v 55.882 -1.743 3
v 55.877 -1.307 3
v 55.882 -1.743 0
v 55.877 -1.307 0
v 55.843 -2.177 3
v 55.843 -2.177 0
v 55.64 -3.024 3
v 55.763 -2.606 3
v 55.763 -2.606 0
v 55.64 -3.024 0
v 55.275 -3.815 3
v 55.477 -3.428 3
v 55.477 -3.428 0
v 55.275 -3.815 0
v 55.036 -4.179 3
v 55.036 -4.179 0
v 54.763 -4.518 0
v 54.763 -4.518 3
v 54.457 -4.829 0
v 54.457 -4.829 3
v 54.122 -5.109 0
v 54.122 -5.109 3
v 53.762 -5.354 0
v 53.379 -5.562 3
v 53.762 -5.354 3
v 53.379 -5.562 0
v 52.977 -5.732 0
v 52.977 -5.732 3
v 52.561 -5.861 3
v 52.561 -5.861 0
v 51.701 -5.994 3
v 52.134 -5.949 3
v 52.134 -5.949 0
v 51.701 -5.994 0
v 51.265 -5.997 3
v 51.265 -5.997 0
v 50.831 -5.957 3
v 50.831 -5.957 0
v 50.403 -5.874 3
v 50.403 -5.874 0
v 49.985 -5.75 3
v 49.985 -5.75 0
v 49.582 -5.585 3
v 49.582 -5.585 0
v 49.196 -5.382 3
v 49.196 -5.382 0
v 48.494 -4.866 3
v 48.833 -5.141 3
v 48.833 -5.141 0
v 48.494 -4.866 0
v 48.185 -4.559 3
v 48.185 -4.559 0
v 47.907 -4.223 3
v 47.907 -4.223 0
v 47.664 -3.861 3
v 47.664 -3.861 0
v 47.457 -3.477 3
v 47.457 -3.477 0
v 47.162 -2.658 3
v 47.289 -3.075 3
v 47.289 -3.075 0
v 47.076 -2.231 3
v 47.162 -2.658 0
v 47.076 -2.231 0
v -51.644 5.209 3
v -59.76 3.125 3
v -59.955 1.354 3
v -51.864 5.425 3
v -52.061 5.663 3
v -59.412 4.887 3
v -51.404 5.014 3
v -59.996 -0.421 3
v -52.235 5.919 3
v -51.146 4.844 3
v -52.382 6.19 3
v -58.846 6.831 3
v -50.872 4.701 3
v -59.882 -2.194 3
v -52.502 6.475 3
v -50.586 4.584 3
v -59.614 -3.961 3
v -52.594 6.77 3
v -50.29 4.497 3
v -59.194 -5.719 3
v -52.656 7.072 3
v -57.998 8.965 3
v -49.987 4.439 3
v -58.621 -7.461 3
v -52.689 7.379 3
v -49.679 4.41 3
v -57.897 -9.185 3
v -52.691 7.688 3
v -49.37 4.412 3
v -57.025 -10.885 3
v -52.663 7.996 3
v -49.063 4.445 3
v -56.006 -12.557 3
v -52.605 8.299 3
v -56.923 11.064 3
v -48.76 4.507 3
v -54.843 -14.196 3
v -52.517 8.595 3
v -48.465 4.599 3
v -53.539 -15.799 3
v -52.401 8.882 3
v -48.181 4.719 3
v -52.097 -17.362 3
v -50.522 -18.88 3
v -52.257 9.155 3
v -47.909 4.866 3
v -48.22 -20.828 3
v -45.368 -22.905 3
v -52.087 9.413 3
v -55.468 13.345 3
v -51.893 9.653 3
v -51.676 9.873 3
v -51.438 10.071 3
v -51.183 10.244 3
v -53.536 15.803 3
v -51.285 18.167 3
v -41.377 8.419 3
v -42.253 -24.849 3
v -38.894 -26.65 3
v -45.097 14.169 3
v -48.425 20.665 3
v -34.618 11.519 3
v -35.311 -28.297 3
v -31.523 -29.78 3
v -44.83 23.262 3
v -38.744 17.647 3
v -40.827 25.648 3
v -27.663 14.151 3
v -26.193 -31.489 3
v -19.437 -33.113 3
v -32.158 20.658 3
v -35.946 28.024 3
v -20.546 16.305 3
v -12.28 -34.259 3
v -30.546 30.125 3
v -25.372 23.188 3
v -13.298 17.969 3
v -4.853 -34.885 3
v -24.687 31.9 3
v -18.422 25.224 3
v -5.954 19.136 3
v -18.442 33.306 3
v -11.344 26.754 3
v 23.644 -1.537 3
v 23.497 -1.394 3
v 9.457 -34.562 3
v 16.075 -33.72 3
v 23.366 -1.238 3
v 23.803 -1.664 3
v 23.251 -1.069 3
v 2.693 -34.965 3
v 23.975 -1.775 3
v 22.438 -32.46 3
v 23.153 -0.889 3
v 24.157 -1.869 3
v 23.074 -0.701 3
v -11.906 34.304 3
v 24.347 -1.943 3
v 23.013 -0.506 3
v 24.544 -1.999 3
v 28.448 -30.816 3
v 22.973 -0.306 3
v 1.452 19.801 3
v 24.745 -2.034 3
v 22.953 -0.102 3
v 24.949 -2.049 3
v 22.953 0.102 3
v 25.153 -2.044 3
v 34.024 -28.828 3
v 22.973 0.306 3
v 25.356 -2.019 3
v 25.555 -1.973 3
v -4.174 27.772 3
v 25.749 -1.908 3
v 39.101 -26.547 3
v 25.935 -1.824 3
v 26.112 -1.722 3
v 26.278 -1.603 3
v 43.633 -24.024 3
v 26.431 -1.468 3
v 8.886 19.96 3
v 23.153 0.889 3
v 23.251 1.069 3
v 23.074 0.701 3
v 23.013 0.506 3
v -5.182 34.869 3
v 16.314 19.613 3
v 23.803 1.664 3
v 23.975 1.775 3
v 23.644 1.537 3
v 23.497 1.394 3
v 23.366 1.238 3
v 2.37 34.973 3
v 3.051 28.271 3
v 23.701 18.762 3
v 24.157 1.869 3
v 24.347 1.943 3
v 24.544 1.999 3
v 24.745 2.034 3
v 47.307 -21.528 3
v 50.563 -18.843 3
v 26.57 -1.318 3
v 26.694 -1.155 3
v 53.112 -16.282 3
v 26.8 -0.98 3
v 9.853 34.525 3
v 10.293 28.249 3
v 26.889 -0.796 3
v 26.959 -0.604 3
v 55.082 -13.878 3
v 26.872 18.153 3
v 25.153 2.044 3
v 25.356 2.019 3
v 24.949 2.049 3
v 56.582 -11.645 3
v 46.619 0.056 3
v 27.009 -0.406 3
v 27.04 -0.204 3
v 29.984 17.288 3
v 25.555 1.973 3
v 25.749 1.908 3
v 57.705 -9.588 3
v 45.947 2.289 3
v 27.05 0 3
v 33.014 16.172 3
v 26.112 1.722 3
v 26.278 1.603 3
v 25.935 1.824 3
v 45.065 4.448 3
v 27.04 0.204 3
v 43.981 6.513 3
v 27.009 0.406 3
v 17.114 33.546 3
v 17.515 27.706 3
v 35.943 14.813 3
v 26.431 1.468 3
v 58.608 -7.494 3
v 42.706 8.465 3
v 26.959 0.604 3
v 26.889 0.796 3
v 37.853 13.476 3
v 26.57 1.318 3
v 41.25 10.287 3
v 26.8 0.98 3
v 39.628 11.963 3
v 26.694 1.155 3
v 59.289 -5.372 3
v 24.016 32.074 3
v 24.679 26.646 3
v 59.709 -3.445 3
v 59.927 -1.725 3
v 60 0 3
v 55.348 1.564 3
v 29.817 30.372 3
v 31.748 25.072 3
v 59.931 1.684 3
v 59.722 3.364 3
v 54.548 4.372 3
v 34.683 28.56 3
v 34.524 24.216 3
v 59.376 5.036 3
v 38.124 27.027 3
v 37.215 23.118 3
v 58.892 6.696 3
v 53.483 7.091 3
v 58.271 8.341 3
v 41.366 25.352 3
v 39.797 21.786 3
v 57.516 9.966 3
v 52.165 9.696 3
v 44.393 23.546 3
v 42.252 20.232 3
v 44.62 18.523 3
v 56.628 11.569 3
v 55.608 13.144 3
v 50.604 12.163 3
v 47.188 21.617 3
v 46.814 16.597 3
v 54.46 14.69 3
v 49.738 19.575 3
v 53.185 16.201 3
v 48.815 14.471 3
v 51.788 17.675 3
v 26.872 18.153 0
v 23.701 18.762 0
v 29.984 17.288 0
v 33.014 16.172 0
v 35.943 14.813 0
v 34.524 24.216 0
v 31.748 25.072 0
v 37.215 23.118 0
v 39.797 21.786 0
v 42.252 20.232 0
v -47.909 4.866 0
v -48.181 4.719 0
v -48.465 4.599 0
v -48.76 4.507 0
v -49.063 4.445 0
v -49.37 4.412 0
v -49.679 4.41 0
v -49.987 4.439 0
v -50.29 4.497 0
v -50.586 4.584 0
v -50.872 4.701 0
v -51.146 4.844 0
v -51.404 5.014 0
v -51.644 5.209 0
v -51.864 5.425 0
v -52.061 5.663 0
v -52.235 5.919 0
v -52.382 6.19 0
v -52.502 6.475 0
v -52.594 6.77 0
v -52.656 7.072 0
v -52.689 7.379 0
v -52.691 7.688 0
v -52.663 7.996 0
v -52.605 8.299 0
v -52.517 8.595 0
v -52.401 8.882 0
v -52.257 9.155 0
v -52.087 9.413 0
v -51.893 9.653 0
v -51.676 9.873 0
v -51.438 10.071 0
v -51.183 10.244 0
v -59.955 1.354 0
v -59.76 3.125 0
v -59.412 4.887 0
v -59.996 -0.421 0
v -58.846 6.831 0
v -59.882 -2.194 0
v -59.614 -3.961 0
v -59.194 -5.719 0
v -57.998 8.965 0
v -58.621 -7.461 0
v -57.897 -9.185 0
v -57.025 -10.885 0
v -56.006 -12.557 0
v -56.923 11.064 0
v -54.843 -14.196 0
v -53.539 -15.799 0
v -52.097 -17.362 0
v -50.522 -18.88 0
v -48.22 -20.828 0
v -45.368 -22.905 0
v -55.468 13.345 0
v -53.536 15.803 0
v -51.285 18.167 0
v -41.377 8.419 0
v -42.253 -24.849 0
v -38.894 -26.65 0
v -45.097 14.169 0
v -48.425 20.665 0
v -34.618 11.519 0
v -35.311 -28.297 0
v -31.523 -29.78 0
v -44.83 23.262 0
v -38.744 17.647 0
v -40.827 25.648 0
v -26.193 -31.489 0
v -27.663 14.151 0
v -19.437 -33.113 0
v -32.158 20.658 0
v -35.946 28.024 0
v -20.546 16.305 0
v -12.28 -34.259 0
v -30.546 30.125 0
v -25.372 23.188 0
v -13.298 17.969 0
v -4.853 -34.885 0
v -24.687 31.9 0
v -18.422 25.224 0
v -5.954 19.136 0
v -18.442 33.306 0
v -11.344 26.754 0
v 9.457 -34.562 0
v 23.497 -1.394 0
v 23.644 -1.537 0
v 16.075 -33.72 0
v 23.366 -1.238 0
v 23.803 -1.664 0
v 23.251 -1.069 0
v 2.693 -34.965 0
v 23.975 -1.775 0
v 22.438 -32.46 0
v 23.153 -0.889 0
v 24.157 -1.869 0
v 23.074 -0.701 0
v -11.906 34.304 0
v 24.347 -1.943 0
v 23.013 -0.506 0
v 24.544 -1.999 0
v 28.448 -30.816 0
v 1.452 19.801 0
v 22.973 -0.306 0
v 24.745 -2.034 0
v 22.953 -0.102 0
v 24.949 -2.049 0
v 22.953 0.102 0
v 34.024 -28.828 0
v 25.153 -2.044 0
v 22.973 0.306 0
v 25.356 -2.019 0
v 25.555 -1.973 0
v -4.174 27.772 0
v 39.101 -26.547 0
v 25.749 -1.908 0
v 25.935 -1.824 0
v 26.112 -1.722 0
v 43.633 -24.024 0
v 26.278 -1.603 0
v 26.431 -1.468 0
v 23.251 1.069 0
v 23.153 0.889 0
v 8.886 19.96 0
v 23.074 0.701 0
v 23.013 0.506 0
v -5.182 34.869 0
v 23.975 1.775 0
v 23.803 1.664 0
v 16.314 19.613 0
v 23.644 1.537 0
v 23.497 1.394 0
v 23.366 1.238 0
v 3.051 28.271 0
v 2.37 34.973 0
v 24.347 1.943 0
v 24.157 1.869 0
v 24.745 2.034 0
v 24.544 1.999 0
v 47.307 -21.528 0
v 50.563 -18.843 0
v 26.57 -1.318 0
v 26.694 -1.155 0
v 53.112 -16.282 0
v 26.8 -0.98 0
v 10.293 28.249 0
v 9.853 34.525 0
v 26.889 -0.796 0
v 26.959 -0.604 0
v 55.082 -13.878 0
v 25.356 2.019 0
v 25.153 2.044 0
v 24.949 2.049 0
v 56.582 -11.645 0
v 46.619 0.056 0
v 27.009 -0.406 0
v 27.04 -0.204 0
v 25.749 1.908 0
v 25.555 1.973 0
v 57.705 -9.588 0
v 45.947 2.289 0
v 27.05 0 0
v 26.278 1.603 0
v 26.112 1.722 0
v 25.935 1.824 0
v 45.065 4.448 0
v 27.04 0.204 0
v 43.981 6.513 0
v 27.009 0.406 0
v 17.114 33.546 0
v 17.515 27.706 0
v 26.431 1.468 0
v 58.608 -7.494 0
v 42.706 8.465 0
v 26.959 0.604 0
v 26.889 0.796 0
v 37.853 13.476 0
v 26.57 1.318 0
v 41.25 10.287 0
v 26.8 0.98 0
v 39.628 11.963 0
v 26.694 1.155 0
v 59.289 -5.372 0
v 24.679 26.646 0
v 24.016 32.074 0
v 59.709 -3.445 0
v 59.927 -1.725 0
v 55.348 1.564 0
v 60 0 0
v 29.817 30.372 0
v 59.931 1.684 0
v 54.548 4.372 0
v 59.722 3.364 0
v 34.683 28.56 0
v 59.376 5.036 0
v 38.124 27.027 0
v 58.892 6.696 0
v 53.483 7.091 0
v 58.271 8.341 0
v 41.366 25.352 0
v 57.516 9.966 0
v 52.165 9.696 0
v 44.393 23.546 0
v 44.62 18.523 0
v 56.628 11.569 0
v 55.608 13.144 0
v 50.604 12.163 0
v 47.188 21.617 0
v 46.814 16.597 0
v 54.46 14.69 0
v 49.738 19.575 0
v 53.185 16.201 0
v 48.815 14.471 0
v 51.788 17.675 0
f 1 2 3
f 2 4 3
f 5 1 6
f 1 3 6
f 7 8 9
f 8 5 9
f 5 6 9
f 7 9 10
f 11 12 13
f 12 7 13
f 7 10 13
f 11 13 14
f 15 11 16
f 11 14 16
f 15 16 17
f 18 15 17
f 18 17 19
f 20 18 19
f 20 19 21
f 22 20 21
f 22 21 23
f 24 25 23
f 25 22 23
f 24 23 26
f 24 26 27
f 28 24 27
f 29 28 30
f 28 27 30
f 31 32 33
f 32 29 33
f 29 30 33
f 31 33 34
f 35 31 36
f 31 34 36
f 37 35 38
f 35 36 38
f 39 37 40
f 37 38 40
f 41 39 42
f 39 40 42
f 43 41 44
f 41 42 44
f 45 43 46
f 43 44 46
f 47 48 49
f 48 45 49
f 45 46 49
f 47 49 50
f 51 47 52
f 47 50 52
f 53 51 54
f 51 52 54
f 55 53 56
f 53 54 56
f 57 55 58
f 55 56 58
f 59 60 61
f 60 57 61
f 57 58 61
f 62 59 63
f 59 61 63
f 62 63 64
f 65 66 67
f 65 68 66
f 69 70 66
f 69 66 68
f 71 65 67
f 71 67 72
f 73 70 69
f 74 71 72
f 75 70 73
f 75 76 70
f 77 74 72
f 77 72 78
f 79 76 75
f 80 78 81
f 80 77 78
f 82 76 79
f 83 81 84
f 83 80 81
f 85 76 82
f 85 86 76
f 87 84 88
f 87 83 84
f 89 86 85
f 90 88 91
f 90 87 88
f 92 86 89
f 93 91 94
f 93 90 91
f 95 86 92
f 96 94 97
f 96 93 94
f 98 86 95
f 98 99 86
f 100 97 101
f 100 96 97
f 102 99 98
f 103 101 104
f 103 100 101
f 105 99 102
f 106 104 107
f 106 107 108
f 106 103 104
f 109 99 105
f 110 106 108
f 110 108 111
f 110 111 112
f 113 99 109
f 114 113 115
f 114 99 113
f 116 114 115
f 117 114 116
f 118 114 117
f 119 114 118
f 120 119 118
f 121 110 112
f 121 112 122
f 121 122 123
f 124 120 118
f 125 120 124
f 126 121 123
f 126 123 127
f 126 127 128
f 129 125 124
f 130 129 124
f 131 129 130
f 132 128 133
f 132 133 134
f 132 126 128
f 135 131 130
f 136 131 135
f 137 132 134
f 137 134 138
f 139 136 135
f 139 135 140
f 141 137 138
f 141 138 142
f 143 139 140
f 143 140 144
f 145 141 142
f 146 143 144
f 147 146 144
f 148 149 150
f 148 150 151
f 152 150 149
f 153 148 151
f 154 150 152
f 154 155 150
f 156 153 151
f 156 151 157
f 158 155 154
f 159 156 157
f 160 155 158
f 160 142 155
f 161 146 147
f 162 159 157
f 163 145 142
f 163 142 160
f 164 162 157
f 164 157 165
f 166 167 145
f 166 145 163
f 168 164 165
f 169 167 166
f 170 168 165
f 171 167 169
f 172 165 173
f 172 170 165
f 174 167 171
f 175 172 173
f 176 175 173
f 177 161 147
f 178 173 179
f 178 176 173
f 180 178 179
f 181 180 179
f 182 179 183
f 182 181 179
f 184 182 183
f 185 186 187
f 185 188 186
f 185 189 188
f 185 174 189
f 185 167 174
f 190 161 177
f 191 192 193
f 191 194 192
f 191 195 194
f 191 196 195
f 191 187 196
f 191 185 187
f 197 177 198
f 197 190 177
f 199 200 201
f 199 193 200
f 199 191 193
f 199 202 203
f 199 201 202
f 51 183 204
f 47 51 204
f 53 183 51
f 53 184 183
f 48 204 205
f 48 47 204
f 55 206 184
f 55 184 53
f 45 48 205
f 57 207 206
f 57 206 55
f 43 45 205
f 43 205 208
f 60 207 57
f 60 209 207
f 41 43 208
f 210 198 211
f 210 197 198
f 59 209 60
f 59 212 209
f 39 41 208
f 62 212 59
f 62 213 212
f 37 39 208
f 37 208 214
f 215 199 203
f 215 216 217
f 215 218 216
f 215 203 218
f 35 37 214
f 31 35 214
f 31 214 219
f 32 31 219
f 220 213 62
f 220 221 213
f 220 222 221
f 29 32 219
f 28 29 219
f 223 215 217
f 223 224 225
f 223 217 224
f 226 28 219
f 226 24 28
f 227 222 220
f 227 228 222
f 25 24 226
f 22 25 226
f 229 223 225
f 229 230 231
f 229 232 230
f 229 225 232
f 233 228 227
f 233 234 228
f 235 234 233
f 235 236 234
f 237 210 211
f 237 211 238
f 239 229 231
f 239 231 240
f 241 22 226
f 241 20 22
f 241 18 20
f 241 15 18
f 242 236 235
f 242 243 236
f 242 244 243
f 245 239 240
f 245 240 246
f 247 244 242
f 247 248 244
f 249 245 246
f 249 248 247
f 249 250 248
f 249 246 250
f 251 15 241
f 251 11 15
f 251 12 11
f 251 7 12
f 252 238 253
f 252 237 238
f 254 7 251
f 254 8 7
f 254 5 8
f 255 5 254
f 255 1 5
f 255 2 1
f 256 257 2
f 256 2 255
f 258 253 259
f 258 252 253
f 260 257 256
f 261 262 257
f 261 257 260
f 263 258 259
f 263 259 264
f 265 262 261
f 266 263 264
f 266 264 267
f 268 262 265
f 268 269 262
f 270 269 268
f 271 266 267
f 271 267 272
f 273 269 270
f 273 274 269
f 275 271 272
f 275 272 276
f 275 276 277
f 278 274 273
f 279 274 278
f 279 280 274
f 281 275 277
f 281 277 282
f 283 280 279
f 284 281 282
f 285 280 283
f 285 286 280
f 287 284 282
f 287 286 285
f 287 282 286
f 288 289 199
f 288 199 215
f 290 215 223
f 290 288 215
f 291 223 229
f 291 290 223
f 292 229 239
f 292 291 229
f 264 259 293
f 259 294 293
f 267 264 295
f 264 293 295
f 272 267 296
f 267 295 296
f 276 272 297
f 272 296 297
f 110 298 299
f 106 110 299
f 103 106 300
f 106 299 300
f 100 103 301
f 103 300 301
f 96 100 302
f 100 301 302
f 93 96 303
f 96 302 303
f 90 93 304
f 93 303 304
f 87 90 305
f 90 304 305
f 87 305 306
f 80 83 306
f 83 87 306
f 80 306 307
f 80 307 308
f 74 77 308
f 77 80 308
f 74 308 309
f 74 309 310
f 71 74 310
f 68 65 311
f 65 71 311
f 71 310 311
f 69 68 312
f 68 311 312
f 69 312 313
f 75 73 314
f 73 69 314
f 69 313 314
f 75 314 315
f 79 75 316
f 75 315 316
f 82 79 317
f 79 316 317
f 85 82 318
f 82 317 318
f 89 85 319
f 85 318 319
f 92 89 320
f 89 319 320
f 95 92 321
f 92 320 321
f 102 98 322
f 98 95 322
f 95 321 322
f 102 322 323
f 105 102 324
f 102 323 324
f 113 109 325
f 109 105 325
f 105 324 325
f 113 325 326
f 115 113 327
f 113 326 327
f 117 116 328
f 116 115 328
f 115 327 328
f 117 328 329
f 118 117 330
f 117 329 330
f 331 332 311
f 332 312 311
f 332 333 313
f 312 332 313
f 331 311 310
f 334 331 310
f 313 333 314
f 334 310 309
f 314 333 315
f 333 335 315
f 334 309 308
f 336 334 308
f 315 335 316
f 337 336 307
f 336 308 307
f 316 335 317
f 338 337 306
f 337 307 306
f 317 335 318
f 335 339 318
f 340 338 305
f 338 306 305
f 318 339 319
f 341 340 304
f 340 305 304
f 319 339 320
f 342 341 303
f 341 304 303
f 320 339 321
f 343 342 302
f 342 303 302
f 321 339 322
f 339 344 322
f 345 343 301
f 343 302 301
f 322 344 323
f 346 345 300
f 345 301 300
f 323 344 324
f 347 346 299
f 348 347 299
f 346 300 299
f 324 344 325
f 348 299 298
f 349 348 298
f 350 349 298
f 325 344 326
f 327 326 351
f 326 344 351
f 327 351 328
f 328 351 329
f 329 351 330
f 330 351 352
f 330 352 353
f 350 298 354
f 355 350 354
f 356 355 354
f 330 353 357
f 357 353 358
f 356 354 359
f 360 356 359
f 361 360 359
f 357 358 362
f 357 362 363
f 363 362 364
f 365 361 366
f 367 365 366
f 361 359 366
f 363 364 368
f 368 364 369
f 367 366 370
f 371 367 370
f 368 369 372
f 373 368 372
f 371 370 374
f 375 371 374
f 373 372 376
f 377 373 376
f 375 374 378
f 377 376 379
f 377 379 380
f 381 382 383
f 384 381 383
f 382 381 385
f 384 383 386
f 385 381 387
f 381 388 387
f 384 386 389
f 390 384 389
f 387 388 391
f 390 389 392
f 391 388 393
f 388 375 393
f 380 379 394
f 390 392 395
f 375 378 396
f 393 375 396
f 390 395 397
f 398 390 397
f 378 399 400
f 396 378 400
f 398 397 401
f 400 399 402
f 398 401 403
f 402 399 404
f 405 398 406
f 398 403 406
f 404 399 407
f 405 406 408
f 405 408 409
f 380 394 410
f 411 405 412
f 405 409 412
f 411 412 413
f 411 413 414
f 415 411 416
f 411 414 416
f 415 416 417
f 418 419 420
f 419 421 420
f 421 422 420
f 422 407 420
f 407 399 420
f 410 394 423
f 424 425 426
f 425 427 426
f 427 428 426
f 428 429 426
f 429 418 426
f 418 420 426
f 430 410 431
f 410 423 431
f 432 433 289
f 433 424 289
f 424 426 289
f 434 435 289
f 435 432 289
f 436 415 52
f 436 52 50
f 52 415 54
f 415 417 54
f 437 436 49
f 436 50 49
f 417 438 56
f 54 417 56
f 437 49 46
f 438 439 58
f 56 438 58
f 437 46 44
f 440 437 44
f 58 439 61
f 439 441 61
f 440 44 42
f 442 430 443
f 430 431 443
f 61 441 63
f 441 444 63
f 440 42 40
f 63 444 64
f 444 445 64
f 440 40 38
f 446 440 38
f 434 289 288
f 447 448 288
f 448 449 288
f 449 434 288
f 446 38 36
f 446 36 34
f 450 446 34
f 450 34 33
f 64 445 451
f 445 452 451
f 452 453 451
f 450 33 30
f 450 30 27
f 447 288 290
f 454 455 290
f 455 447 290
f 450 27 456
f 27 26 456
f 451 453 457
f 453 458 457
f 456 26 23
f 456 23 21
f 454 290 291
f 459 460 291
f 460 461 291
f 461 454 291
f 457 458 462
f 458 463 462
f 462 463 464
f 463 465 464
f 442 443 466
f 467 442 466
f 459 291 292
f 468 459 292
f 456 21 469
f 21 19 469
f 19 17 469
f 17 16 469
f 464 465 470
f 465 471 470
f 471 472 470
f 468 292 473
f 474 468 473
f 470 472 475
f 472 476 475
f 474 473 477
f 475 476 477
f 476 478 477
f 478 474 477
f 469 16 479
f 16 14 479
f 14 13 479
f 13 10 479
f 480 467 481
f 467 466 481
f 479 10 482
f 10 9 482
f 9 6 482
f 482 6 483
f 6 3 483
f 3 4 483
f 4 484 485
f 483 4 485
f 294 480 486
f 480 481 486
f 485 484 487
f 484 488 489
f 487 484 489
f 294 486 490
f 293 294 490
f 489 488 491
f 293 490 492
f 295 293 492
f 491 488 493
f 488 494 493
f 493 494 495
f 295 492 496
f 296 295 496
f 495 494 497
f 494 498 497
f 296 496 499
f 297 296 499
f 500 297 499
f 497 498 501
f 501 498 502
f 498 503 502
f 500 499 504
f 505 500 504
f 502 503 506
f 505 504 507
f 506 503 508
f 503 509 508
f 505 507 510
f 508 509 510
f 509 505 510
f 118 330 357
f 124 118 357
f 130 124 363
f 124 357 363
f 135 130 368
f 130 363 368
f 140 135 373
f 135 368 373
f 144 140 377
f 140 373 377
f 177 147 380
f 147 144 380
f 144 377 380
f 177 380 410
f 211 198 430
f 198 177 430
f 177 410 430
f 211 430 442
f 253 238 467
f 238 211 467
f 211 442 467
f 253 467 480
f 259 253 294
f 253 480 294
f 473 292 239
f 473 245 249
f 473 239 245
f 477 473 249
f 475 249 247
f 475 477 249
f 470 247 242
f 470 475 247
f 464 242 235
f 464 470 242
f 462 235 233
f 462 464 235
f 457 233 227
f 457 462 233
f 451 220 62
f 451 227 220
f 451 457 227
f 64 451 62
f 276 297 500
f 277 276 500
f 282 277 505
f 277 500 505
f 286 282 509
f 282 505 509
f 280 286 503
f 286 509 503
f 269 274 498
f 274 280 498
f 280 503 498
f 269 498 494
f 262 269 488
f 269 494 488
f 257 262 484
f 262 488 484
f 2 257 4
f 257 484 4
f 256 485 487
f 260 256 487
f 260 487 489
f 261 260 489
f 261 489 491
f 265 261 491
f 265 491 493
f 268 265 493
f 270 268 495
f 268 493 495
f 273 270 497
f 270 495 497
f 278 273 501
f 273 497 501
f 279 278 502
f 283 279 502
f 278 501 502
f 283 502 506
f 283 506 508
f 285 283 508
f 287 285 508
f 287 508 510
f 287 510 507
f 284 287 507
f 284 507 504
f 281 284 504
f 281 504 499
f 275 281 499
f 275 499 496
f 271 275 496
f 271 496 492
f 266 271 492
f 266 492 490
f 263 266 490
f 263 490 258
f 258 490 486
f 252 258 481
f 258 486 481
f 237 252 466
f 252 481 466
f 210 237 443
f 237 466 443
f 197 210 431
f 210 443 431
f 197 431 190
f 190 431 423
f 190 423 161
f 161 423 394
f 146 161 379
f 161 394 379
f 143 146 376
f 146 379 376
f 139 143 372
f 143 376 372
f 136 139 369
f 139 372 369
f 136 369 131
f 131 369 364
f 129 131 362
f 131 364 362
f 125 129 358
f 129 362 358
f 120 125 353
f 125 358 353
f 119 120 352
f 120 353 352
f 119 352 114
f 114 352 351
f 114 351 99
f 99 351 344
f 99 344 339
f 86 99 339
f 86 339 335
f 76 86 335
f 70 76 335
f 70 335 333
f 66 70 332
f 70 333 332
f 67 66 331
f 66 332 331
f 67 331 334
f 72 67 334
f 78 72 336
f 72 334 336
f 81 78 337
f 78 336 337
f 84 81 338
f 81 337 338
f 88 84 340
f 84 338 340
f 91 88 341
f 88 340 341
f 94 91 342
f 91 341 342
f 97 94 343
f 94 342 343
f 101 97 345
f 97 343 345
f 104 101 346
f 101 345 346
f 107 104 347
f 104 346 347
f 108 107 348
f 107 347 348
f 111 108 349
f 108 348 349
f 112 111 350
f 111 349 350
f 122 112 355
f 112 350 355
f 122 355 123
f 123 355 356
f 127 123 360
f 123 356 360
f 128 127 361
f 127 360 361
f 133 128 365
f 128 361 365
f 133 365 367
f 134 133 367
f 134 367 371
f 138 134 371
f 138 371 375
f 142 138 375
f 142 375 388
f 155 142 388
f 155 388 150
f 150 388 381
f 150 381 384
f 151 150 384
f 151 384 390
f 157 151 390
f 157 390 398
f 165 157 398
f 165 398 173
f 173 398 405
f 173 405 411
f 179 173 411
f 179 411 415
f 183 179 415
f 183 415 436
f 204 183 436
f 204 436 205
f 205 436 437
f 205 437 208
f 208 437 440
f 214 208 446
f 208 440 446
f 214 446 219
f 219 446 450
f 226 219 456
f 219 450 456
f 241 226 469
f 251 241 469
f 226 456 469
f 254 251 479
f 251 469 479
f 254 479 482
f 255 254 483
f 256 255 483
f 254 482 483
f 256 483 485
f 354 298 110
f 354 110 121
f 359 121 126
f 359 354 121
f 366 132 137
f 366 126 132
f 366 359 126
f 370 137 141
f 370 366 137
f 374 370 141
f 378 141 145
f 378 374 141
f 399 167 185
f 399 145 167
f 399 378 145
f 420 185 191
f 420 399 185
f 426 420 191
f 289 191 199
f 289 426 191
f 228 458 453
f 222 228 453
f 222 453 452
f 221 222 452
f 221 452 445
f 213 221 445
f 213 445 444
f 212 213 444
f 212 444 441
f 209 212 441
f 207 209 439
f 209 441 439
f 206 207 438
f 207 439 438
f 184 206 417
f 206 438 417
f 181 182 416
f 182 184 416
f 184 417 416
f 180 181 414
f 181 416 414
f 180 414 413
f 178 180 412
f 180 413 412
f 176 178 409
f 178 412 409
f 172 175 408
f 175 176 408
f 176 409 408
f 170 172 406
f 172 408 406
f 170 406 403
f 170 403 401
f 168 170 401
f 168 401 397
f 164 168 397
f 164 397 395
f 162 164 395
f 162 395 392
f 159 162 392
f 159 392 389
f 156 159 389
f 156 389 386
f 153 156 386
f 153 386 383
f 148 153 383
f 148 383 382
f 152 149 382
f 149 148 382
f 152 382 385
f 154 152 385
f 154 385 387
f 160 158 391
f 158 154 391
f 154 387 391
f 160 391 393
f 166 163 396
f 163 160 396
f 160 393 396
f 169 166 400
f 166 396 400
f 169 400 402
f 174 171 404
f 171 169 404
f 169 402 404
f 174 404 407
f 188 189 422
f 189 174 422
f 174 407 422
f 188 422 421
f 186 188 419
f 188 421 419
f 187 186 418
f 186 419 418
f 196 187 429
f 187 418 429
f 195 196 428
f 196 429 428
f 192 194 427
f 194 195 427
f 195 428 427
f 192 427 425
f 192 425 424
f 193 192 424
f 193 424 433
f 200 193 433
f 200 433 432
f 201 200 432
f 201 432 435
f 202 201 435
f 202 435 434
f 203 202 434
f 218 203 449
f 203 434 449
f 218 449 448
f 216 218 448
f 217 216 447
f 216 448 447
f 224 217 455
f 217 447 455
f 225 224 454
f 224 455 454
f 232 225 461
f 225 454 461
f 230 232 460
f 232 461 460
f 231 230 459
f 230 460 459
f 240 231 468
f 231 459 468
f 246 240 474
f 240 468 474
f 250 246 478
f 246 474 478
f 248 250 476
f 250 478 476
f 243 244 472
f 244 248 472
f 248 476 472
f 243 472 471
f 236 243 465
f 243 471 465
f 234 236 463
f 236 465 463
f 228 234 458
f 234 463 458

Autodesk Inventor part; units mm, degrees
ref_plane "YZ Plane" through (0, 0, 0) normal (1, 0, 0) x (0, 1, 0)
ref_plane "XZ Plane" through (0, 0, 0) normal (0, 1, 0) x (-1, 0, 0)
ref_plane "XY Plane" through (0, 0, 0) normal (0, 0, 1) x (1, 0, 0)
sketch "Sketch1" plane through (0, 0, 0) normal (0, 0, 1) x (1, 0, 0)
  ellipse E0 centre (0, 0) end of major axis (60, 0) minor radius 35
  arc A0 (31.7478, 25.0725) -> (-51.1828, 10.244) centre (6.3686, -72.3059) ccw
  arc A1 (23.7013, 18.7616) -> (-47.9094, 4.8665) centre (7.508, -89.26) ccw
  arc A2 (55.8771, -1.3072) -> (42.2522, 20.2317) centre (25.552, -5.4112) ccw
  arc A3 (47.0757, -2.2311) -> (35.9428, 14.8131) centre (22.8888, -5.8715) ccw
  arc A4 (35.9428, 14.8131) -> (23.7013, 18.7616) centre (17.8337, -20.3799) ccw
  arc A5 (42.2522, 20.2317) -> (31.7478, 25.0725) centre (23.4586, -6.7326) ccw
  arc A6 (-51.1828, 10.244) -> (-47.9094, 4.8665) centre (-49.5461, 7.5553) ccw
  arc A7 (47.0757, -2.2311) -> (55.8771, -1.3072) centre (51.4557, -1.5719) ccw
  circle A8 centre (25, 0) radius 2.05
  dimension "d0" = 60
  dimension "d1" = 35
  dimension "d7" = 4.1
  dimension "d8" = 25
extrude "Extrusion1" add sketch "Sketch1" along normal blind 3
properties part number "Rail1st_withoutD"
